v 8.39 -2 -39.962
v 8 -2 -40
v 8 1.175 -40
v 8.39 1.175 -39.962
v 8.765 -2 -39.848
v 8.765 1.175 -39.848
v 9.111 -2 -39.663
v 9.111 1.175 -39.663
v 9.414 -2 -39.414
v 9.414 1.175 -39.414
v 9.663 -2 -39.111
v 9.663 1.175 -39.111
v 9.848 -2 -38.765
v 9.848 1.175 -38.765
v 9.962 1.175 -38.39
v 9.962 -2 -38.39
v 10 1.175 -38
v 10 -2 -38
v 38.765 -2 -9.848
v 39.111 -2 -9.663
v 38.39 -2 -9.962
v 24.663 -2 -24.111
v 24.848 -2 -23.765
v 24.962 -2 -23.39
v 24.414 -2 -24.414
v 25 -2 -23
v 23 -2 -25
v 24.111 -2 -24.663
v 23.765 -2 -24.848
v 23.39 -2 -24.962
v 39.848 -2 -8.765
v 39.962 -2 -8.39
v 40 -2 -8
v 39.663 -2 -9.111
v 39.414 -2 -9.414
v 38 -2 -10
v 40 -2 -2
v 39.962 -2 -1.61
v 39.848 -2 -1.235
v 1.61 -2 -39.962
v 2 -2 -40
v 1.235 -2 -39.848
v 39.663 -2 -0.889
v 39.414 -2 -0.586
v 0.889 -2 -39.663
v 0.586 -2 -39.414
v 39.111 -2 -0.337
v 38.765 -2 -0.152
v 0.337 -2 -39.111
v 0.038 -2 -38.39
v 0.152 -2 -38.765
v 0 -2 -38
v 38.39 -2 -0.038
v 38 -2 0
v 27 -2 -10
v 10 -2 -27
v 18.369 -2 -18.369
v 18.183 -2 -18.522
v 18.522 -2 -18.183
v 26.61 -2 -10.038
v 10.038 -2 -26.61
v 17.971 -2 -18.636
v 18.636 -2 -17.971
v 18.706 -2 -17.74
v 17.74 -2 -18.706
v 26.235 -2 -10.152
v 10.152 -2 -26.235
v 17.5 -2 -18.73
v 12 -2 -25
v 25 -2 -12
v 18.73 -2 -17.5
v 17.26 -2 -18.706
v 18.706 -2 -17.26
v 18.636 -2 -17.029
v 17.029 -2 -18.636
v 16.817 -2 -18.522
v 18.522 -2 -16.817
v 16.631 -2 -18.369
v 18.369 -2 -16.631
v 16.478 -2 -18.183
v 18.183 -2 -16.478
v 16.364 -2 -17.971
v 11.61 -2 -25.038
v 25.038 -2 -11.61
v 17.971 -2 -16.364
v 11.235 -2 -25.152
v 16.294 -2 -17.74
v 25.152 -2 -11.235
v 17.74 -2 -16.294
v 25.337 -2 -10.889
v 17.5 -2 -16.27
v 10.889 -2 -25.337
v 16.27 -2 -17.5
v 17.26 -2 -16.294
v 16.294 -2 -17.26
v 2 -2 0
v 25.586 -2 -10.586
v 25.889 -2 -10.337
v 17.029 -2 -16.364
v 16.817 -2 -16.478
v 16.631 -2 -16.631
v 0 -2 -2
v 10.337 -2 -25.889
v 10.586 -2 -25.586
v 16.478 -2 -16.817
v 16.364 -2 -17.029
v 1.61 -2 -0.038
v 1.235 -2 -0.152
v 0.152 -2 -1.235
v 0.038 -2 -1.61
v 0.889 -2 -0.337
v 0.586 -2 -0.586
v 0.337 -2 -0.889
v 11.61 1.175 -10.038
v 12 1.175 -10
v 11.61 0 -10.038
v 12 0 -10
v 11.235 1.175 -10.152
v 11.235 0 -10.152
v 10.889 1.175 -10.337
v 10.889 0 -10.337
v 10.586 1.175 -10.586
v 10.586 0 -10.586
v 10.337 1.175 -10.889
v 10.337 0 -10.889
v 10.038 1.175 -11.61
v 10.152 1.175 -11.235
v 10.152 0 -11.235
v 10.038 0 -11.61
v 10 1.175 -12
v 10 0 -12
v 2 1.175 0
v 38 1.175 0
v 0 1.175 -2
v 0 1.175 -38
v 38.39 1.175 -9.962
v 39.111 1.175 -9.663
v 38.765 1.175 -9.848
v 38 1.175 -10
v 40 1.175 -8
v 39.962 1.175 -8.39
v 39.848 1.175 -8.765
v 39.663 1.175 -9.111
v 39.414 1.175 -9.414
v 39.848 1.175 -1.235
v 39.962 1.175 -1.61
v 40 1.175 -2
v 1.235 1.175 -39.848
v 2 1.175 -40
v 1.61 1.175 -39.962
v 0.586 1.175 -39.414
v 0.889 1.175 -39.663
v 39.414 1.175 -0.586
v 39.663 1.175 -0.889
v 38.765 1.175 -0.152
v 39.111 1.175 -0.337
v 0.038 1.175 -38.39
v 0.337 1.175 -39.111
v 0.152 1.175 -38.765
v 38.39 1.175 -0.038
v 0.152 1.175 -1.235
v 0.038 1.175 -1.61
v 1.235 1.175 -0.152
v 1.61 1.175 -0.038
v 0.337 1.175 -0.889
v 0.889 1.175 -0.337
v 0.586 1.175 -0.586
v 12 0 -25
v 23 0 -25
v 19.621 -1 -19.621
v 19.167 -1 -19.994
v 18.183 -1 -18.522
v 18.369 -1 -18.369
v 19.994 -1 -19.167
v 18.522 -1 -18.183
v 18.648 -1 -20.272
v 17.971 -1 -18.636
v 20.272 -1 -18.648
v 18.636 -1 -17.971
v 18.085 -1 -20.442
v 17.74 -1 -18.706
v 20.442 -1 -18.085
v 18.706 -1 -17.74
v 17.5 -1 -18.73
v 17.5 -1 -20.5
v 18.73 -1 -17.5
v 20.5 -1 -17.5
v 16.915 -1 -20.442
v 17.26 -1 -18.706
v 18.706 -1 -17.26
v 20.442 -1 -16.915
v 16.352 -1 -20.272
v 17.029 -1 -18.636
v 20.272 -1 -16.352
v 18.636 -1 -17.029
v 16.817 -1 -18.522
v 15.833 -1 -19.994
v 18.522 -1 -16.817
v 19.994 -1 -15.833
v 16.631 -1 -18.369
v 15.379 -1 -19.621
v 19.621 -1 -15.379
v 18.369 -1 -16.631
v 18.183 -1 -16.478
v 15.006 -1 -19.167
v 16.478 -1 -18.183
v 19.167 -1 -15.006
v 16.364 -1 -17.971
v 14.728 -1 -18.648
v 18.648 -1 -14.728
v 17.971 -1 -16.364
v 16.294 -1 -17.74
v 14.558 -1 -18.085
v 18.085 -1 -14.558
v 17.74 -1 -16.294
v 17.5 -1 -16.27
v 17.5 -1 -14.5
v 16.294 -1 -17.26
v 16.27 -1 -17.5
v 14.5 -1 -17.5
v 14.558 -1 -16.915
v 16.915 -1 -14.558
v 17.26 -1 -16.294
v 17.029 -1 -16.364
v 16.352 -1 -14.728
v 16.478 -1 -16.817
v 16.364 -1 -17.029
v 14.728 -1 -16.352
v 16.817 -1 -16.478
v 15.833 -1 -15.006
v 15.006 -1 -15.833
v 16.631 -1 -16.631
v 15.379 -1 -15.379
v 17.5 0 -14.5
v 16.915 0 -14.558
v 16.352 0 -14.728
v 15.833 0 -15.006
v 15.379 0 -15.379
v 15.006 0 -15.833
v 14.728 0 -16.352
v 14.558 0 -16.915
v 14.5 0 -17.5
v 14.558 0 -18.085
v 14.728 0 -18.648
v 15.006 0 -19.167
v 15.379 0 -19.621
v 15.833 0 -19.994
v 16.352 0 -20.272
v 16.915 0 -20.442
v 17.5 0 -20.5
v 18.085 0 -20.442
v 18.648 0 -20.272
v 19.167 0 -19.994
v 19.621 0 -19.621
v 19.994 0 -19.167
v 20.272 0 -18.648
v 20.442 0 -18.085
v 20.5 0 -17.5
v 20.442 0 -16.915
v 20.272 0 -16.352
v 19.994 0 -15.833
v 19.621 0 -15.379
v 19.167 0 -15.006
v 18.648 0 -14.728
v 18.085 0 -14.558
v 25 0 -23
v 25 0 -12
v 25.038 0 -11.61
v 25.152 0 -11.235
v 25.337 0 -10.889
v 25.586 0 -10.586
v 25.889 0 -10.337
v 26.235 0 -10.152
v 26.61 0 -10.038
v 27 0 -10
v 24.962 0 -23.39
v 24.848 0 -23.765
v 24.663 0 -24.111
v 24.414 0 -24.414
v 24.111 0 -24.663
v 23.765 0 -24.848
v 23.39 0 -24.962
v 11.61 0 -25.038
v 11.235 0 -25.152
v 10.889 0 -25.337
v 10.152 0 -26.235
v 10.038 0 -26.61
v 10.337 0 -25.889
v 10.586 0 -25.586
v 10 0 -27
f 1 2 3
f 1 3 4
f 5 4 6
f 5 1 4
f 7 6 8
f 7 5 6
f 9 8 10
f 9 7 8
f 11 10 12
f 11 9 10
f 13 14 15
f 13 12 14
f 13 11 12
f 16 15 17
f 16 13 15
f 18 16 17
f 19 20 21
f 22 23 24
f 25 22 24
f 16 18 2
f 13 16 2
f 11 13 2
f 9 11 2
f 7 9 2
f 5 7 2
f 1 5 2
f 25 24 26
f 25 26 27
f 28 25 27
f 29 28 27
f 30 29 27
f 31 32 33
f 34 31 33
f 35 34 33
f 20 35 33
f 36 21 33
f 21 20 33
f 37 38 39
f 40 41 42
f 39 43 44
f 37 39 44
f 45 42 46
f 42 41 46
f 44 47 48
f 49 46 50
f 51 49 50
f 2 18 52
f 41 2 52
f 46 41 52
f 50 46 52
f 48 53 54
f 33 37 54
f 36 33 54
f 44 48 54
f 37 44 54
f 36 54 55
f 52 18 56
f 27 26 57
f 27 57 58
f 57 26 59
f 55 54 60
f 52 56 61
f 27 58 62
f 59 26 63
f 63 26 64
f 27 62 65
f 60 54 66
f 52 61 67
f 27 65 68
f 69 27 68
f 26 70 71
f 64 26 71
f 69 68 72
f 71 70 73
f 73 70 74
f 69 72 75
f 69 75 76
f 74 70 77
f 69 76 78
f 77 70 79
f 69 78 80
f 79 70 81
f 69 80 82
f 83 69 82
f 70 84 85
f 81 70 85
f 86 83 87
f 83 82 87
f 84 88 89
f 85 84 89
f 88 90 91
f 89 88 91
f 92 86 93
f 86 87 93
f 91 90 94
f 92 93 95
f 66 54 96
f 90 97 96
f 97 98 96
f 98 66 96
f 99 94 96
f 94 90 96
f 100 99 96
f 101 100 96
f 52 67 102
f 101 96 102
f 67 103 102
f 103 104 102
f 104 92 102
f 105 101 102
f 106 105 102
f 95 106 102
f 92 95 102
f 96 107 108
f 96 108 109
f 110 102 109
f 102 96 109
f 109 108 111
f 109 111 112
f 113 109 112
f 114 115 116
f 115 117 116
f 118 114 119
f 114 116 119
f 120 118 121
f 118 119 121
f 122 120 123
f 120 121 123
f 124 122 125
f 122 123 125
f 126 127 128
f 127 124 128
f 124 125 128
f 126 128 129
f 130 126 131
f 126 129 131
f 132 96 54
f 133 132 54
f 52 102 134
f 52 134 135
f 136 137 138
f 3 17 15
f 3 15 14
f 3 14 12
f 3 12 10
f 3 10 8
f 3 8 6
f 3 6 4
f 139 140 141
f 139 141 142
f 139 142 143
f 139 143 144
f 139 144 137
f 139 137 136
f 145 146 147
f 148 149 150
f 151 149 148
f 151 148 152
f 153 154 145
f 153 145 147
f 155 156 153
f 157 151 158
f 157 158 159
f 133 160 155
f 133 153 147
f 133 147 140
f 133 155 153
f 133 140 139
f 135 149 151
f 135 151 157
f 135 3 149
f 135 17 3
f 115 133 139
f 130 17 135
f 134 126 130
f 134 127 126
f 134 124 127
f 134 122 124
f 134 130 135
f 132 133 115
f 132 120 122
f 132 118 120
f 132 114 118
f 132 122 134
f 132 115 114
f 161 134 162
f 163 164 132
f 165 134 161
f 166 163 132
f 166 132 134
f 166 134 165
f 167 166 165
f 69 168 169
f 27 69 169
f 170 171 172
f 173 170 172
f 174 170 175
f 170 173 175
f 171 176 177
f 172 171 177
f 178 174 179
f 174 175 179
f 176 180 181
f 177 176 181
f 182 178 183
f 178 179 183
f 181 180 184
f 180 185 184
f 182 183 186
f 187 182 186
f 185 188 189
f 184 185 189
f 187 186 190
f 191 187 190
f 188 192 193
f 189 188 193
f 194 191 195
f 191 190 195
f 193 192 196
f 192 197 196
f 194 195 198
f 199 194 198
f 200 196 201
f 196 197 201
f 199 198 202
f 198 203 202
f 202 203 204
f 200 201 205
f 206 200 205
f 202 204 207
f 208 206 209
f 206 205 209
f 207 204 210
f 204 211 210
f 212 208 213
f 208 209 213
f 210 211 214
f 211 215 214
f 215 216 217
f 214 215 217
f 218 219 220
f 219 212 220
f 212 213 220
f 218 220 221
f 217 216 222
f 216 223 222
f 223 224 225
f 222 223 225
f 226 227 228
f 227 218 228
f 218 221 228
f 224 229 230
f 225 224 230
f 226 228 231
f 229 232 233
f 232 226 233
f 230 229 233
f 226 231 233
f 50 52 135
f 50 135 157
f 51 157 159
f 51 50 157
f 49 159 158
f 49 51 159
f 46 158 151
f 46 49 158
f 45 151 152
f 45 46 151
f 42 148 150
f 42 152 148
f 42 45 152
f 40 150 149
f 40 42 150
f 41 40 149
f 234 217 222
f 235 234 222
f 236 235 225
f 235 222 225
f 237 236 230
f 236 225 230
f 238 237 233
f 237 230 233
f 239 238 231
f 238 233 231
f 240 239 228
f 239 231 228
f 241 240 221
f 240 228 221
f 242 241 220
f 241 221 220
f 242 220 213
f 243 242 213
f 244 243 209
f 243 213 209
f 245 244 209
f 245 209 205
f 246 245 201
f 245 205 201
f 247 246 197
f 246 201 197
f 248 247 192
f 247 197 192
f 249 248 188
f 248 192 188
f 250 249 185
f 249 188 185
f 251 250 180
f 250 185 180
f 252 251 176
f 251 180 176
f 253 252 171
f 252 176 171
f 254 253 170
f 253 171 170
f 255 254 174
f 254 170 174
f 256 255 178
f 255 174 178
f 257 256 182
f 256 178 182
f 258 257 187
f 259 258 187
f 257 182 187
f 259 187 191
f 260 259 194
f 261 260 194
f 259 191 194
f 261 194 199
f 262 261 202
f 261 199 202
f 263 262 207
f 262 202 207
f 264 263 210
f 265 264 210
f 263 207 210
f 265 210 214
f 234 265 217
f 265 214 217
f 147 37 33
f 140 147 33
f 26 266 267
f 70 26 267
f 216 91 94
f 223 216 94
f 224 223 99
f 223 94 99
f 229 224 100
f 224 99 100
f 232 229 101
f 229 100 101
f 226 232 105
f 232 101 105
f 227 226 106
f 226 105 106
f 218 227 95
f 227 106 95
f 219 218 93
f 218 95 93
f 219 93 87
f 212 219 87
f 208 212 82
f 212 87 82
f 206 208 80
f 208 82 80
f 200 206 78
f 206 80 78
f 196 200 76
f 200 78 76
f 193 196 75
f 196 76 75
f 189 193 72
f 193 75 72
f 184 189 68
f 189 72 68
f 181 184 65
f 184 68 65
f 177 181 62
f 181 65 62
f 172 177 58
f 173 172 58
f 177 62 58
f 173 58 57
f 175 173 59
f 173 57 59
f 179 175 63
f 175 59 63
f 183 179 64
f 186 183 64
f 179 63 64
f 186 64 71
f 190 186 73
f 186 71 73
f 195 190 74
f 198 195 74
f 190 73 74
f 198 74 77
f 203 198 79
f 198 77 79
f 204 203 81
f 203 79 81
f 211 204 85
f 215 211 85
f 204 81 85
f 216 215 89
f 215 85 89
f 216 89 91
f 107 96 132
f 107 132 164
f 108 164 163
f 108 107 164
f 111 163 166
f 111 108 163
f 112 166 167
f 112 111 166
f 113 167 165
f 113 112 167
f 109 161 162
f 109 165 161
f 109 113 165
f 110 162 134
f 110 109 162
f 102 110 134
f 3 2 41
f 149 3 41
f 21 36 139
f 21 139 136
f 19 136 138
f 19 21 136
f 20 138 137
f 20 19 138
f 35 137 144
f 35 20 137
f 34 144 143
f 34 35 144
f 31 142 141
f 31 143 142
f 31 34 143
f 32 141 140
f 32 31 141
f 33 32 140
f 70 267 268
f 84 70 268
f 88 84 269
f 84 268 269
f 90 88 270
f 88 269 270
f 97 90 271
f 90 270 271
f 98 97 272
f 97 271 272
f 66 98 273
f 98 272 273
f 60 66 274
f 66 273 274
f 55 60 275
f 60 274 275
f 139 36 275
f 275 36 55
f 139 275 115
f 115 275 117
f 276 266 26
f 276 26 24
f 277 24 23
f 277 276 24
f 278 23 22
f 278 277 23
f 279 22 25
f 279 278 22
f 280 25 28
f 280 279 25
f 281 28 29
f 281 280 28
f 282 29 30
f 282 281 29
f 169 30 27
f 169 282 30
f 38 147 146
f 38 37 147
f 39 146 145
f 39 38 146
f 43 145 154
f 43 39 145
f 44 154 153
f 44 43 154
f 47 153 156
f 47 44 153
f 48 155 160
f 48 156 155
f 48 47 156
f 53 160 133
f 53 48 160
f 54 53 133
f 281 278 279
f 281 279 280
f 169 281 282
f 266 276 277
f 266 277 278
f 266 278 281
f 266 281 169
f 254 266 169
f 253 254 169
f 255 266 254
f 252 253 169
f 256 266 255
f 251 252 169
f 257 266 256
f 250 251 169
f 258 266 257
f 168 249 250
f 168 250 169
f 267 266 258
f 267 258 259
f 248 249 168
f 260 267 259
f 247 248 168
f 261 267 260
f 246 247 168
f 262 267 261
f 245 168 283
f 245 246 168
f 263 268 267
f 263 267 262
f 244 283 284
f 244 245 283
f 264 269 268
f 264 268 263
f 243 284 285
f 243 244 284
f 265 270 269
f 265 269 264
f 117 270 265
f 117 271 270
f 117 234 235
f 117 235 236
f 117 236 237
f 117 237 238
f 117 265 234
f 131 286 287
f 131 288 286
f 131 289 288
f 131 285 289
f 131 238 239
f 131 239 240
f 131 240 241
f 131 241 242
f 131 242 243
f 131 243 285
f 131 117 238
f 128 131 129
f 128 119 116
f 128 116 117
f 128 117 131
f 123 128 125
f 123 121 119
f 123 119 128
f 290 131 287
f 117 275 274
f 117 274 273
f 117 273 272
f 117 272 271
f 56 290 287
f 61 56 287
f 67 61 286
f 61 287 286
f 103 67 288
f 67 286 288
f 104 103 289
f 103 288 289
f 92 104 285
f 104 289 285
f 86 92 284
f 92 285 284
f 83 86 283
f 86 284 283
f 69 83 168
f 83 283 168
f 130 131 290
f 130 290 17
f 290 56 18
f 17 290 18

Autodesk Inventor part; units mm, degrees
ref_plane "YZ Plane" through (0, 0, 0) normal (1, 0, 0) x (0, 1, 0)
ref_plane "XZ Plane" through (0, 0, 0) normal (0, 1, 0) x (-1, 0, 0)
ref_plane "XY Plane" through (0, 0, 0) normal (0, 0, 1) x (1, 0, 0)
sketch "Sketch1" plane through (0, 0, 0) normal (0, 1, 0) x (-1, 0, 0)
  line L0 (0, -2) -> (0, -38)
  line L1 (-2, 0) -> (-38, 0)
  line L2 (-40, -2) -> (-40, -8)
  line L3 (-38, -10) -> (-27, -10)
  line L4 (-10, -27) -> (-10, -38)
  line L5 (-8, -40) -> (-2, -40)
  line L6 (-12, -25) -> (-23, -25)
  line L7 (-25, -23) -> (-25, -12)
  arc A0 (-10, -27) -> (-12, -25) centre (-12, -27) ccw
  arc A1 (-25, -23) -> (-23, -25) centre (-23, -23) ccw
  arc A2 (-25, -12) -> (-27, -10) centre (-27, -12) ccw
  arc A3 (-10, -38) -> (-8, -40) centre (-8, -38) ccw
  arc A4 (-40, -8) -> (-38, -10) centre (-38, -8) ccw
  arc A5 (-38, 0) -> (-40, -2) centre (-38, -2) ccw
  arc A6 (0, -2) -> (-2, 0) centre (-2, -2) ccw
  arc A7 (-2, -40) -> (0, -38) centre (-2, -38) ccw
  line L8 (-27, -10) -> (-12, -10)
  line L9 (-10, -27) -> (-10, -12)
  arc A8 (-10, -12) -> (-12, -10) centre (-12, -12) ccw
  point P0 (0, 0)
  point P1 (0, -40)
  point P2 (-40, 0)
  point P3 (-40, -10)
  point P4 (-10, -10)
  point P5 (-10, -40)
  point P6 (-10, -25)
  point P7 (-25, -25)
  point P8 (-25, -10)
  point P9 (-17.5, -17.5)
  dimension "d0" = 40
  dimension "d2" = 10
  dimension "d8" = 15
  dimension "d9" = 15
  dimension "d11" = 10
  dimension "d12" = 40
  dimension "d13" = 2
  dimension "d14" = 2
extrude "Extrusion1" add sketch "Sketch1" along normal blind 1.175 contours L0 A7 L5 A3 L4 L9 A8 L8 L3 A4 L2 A5 L1 A6
extrude "Extrusion2" add sketch "Sketch1" against normal blind 2
hole "Hole1" at (17.5, 0, -17.5) direction (0, -1, 0) diameter 2.459 depth 8.8 tip angle 118 counterbore diameter 6 counterbore depth 1 thread size "M3x0.5" class "6H" standard "ANSI Metric M Profile"
properties part number "Standoff_Corner"
